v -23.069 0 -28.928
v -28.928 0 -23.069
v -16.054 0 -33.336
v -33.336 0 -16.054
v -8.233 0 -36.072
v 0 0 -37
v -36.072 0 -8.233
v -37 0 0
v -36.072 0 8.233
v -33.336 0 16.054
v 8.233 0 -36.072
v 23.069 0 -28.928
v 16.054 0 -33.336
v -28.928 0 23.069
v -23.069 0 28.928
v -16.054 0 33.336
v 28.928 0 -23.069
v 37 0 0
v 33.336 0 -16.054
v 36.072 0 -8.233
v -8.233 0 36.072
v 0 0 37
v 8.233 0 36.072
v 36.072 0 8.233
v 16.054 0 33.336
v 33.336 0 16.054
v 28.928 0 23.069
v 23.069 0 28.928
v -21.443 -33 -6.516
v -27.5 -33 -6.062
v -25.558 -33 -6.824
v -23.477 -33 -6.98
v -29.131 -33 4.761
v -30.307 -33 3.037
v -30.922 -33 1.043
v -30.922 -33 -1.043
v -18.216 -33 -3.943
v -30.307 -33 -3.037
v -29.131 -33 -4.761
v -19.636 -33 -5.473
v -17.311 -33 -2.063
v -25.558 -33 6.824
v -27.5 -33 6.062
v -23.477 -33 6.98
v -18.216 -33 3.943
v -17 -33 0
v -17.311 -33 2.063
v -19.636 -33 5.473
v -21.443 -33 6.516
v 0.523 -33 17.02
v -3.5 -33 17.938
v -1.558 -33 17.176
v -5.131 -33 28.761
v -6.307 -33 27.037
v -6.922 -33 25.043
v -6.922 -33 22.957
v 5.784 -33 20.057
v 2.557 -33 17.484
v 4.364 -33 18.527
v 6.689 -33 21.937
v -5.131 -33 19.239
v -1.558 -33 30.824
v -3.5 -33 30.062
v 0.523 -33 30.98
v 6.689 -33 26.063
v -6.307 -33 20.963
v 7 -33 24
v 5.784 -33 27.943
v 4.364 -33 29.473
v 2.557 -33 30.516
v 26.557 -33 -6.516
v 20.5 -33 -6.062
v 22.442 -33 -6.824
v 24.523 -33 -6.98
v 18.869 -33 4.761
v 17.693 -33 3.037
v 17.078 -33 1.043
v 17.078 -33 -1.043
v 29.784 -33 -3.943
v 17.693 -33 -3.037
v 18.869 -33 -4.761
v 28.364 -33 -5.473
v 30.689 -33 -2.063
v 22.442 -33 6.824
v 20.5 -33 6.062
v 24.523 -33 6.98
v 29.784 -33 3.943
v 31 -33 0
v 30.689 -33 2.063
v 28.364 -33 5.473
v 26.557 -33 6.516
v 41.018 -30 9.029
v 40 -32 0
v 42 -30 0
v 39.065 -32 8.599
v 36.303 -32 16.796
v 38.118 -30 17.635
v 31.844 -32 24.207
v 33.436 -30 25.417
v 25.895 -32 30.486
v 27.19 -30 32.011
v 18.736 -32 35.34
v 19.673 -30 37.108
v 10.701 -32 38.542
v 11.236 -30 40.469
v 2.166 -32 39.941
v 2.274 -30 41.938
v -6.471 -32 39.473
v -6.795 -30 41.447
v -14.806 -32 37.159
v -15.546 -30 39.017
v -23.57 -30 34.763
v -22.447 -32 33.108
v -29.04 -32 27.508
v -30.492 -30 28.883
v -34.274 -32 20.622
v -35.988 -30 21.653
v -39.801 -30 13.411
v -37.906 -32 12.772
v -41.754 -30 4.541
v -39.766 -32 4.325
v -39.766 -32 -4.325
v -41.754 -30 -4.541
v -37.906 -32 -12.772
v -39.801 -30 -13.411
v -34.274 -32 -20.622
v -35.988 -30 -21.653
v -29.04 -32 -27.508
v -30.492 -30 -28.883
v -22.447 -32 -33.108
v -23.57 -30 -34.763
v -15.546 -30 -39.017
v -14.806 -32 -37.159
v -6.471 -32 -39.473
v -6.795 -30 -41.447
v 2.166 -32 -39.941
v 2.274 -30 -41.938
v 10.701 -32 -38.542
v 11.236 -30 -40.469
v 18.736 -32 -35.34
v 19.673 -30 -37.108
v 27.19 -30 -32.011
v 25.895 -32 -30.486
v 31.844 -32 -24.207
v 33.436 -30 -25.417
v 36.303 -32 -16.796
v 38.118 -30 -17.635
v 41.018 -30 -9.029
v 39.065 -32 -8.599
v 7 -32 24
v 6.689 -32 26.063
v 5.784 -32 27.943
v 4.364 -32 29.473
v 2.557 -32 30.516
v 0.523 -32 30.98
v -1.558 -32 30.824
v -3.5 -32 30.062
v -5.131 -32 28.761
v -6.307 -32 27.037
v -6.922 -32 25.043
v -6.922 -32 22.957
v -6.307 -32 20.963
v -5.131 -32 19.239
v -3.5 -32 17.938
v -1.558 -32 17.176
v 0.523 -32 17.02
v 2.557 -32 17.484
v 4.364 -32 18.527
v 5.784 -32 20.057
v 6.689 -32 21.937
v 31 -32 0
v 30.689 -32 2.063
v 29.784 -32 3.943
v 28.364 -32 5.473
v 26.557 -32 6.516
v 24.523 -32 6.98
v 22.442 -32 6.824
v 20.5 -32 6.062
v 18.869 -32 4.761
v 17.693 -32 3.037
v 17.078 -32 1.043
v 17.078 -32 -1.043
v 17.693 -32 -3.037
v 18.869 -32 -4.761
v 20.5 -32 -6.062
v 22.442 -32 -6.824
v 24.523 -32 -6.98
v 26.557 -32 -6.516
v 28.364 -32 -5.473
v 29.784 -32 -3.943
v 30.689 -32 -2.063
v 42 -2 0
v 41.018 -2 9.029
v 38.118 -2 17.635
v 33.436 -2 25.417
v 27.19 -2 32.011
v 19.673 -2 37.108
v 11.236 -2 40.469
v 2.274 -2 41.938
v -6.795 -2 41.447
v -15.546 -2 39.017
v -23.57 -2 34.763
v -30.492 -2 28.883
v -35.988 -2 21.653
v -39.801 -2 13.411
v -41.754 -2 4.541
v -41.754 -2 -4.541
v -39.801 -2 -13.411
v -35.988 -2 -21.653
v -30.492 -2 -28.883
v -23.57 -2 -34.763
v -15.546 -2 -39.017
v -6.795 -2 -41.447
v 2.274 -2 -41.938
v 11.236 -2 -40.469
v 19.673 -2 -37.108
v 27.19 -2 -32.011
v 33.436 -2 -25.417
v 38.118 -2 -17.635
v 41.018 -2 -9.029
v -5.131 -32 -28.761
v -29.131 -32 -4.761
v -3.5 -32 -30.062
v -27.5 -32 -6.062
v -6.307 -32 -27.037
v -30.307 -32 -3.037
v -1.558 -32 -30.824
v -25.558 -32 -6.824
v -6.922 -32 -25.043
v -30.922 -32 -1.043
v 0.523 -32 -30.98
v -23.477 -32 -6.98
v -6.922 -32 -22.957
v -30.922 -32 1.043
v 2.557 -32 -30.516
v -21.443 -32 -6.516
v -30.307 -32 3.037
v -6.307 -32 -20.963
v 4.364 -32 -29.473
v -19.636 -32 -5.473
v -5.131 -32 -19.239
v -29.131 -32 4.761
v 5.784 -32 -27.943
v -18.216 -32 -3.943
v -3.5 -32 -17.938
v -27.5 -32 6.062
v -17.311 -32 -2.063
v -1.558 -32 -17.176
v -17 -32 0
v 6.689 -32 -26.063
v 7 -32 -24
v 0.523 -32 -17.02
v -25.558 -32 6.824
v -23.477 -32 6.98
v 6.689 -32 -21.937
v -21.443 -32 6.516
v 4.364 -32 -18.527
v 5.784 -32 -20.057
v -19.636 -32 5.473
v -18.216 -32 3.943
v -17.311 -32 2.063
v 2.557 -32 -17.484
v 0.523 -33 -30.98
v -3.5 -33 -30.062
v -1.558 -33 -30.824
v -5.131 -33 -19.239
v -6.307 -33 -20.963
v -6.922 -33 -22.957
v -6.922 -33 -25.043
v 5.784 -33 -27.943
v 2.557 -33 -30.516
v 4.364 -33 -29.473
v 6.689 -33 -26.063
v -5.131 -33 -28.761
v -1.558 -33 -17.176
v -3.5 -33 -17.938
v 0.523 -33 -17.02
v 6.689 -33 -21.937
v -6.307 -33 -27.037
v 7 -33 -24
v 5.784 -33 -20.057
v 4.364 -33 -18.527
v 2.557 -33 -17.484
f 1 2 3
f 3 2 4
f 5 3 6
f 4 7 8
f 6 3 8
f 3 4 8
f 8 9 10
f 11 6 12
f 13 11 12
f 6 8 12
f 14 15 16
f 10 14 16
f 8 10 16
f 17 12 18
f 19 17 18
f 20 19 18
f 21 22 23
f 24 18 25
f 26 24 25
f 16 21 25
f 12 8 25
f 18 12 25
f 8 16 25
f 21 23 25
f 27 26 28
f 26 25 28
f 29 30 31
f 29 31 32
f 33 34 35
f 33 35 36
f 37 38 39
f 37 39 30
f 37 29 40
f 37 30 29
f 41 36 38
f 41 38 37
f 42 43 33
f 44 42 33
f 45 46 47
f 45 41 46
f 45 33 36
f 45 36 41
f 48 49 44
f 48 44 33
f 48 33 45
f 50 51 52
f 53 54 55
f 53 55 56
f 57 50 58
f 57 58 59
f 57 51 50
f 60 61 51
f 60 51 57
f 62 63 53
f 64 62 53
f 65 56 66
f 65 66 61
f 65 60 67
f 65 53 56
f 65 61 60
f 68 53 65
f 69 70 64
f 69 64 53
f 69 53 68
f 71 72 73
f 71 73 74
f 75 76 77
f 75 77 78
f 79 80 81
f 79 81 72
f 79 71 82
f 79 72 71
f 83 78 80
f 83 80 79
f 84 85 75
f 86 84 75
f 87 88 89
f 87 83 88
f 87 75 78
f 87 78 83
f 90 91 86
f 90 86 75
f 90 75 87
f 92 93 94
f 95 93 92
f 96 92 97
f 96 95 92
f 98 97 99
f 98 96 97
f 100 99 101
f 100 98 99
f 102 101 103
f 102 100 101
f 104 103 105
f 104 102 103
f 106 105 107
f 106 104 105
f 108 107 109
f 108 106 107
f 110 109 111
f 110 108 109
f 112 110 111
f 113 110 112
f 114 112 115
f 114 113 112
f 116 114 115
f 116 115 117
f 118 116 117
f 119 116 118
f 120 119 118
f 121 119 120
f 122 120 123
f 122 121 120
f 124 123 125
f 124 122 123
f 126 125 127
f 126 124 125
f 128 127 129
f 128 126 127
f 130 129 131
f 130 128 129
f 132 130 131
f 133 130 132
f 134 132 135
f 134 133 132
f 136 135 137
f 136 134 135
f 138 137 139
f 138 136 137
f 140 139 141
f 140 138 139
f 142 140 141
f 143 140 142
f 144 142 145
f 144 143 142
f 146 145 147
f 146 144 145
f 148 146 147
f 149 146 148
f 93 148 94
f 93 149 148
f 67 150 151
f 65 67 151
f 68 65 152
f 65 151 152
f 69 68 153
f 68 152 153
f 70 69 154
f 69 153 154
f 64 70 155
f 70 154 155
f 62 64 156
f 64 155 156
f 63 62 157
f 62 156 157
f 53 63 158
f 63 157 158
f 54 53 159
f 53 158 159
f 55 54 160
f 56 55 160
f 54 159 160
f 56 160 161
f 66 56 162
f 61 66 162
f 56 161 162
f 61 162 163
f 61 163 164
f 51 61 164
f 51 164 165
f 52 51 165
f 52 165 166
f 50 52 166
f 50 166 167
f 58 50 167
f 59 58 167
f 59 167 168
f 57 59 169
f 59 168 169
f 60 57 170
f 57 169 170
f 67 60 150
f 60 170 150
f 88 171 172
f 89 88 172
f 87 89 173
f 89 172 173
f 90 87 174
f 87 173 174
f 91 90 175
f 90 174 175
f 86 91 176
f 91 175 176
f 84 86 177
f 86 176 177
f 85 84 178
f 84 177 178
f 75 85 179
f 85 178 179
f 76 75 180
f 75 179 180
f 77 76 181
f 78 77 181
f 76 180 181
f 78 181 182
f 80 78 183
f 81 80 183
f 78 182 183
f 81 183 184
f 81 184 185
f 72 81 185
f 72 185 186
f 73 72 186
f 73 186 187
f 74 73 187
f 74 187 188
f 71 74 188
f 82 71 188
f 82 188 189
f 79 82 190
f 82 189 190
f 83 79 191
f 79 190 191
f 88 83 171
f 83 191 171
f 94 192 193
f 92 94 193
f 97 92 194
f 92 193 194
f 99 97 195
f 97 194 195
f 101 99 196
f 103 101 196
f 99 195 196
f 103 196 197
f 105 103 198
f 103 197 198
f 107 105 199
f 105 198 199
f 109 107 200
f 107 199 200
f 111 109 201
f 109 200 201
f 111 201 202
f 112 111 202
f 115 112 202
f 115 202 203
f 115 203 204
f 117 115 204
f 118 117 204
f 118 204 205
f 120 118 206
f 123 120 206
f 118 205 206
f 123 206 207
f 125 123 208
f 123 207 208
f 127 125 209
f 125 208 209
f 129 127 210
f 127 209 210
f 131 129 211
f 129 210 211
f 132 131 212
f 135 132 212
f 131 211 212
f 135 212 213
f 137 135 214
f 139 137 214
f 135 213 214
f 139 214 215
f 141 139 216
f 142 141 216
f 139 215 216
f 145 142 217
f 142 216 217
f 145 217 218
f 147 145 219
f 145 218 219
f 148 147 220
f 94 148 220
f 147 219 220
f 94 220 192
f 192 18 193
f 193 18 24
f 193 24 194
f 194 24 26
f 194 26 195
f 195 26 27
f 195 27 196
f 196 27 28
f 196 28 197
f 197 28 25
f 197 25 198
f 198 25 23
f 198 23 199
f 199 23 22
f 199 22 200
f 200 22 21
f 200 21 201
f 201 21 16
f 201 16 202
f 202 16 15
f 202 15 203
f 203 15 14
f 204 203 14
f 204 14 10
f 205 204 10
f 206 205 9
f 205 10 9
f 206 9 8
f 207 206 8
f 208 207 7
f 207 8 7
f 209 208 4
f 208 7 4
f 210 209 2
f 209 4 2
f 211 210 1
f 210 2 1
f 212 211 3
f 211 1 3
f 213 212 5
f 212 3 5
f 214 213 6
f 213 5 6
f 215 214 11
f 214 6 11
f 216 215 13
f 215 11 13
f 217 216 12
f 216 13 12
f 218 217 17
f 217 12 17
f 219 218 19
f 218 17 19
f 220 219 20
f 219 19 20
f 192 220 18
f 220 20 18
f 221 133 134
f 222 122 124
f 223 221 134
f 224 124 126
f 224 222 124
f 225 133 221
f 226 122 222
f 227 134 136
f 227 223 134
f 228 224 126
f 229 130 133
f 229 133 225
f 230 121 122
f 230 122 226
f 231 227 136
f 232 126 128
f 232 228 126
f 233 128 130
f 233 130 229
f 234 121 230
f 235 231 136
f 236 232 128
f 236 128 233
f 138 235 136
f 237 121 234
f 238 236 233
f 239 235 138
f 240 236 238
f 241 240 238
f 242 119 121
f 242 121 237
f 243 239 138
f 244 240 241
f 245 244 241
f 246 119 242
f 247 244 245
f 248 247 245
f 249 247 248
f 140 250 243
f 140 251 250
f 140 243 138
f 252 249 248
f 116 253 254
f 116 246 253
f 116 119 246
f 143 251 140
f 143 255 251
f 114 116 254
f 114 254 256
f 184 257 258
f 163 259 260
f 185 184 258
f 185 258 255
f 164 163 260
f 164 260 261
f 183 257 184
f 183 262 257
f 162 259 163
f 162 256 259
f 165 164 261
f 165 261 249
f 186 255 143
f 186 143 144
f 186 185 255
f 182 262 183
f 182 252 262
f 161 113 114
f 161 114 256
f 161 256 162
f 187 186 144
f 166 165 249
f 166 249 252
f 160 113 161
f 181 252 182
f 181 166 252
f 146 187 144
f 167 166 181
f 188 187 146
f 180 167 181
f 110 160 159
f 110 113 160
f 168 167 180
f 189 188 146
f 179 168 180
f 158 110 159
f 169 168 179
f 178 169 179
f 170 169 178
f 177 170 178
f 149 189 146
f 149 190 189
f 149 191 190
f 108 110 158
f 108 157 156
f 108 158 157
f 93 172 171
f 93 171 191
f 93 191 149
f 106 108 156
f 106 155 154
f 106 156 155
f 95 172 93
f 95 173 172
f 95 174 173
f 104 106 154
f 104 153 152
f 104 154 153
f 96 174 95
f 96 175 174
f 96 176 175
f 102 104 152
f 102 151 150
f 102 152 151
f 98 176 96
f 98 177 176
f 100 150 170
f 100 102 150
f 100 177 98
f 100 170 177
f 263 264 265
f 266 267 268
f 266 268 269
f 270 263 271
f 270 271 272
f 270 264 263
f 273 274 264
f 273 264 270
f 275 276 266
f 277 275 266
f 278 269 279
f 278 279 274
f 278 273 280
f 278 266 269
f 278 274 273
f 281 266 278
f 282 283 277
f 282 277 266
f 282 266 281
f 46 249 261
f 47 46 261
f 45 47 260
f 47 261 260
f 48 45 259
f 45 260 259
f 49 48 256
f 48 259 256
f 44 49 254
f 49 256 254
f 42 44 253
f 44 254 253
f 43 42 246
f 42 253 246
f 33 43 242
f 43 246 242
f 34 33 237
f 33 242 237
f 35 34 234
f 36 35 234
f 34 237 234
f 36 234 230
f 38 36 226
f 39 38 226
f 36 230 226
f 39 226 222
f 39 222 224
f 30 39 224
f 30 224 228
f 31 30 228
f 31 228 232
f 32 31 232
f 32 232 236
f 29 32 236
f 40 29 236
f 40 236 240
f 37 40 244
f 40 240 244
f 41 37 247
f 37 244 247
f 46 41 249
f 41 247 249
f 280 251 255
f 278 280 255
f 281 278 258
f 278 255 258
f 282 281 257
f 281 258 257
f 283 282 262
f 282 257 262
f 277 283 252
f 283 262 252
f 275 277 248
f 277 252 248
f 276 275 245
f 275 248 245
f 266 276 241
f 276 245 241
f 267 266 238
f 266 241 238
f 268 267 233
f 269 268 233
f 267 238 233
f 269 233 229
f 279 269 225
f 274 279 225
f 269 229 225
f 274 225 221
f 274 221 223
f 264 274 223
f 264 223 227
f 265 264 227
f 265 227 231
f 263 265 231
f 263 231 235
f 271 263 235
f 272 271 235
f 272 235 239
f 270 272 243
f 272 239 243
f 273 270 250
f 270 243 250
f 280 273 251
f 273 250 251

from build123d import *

# Parameters (mm, degrees)
F0_R     = 42
F1_DEPTH = 32
F2_SIZE2 = 5
F2_SIZE  = 2
F3_SIZE  = 2
F4_R     = 7
F5_DEPTH = 1


with BuildPart() as f1:
    # F0 (on Front) → F1 (new body)
    with BuildSketch(Plane.XZ):
        Circle(F0_R)
    extrude(amount=F1_DEPTH)

    # F2
    f2_edges = [f1.edges().sort_by_distance(p)[0] for p in [
        (-42, 0, 0),
    ]]
    chamfer(f2_edges, length=F2_SIZE, length2=F2_SIZE2)

    # F3
    f3_edges = [f1.edges().sort_by_distance(p)[0] for p in [
        (-42, -32, 0),
    ]]
    chamfer(f3_edges, length=F3_SIZE)

    # F4 (on face) → F5 (join)
    with BuildSketch(Plane.XZ.offset(32)):
        with Locations((-24, 0)):
            Circle(F4_R)
        with Locations((24, 0)):
            Circle(F4_R)
        with Locations((0, 24)):
            Circle(F4_R)
        with Locations((0, -24)):
            Circle(F4_R)
    extrude(amount=F5_DEPTH)


solid = f1.part
